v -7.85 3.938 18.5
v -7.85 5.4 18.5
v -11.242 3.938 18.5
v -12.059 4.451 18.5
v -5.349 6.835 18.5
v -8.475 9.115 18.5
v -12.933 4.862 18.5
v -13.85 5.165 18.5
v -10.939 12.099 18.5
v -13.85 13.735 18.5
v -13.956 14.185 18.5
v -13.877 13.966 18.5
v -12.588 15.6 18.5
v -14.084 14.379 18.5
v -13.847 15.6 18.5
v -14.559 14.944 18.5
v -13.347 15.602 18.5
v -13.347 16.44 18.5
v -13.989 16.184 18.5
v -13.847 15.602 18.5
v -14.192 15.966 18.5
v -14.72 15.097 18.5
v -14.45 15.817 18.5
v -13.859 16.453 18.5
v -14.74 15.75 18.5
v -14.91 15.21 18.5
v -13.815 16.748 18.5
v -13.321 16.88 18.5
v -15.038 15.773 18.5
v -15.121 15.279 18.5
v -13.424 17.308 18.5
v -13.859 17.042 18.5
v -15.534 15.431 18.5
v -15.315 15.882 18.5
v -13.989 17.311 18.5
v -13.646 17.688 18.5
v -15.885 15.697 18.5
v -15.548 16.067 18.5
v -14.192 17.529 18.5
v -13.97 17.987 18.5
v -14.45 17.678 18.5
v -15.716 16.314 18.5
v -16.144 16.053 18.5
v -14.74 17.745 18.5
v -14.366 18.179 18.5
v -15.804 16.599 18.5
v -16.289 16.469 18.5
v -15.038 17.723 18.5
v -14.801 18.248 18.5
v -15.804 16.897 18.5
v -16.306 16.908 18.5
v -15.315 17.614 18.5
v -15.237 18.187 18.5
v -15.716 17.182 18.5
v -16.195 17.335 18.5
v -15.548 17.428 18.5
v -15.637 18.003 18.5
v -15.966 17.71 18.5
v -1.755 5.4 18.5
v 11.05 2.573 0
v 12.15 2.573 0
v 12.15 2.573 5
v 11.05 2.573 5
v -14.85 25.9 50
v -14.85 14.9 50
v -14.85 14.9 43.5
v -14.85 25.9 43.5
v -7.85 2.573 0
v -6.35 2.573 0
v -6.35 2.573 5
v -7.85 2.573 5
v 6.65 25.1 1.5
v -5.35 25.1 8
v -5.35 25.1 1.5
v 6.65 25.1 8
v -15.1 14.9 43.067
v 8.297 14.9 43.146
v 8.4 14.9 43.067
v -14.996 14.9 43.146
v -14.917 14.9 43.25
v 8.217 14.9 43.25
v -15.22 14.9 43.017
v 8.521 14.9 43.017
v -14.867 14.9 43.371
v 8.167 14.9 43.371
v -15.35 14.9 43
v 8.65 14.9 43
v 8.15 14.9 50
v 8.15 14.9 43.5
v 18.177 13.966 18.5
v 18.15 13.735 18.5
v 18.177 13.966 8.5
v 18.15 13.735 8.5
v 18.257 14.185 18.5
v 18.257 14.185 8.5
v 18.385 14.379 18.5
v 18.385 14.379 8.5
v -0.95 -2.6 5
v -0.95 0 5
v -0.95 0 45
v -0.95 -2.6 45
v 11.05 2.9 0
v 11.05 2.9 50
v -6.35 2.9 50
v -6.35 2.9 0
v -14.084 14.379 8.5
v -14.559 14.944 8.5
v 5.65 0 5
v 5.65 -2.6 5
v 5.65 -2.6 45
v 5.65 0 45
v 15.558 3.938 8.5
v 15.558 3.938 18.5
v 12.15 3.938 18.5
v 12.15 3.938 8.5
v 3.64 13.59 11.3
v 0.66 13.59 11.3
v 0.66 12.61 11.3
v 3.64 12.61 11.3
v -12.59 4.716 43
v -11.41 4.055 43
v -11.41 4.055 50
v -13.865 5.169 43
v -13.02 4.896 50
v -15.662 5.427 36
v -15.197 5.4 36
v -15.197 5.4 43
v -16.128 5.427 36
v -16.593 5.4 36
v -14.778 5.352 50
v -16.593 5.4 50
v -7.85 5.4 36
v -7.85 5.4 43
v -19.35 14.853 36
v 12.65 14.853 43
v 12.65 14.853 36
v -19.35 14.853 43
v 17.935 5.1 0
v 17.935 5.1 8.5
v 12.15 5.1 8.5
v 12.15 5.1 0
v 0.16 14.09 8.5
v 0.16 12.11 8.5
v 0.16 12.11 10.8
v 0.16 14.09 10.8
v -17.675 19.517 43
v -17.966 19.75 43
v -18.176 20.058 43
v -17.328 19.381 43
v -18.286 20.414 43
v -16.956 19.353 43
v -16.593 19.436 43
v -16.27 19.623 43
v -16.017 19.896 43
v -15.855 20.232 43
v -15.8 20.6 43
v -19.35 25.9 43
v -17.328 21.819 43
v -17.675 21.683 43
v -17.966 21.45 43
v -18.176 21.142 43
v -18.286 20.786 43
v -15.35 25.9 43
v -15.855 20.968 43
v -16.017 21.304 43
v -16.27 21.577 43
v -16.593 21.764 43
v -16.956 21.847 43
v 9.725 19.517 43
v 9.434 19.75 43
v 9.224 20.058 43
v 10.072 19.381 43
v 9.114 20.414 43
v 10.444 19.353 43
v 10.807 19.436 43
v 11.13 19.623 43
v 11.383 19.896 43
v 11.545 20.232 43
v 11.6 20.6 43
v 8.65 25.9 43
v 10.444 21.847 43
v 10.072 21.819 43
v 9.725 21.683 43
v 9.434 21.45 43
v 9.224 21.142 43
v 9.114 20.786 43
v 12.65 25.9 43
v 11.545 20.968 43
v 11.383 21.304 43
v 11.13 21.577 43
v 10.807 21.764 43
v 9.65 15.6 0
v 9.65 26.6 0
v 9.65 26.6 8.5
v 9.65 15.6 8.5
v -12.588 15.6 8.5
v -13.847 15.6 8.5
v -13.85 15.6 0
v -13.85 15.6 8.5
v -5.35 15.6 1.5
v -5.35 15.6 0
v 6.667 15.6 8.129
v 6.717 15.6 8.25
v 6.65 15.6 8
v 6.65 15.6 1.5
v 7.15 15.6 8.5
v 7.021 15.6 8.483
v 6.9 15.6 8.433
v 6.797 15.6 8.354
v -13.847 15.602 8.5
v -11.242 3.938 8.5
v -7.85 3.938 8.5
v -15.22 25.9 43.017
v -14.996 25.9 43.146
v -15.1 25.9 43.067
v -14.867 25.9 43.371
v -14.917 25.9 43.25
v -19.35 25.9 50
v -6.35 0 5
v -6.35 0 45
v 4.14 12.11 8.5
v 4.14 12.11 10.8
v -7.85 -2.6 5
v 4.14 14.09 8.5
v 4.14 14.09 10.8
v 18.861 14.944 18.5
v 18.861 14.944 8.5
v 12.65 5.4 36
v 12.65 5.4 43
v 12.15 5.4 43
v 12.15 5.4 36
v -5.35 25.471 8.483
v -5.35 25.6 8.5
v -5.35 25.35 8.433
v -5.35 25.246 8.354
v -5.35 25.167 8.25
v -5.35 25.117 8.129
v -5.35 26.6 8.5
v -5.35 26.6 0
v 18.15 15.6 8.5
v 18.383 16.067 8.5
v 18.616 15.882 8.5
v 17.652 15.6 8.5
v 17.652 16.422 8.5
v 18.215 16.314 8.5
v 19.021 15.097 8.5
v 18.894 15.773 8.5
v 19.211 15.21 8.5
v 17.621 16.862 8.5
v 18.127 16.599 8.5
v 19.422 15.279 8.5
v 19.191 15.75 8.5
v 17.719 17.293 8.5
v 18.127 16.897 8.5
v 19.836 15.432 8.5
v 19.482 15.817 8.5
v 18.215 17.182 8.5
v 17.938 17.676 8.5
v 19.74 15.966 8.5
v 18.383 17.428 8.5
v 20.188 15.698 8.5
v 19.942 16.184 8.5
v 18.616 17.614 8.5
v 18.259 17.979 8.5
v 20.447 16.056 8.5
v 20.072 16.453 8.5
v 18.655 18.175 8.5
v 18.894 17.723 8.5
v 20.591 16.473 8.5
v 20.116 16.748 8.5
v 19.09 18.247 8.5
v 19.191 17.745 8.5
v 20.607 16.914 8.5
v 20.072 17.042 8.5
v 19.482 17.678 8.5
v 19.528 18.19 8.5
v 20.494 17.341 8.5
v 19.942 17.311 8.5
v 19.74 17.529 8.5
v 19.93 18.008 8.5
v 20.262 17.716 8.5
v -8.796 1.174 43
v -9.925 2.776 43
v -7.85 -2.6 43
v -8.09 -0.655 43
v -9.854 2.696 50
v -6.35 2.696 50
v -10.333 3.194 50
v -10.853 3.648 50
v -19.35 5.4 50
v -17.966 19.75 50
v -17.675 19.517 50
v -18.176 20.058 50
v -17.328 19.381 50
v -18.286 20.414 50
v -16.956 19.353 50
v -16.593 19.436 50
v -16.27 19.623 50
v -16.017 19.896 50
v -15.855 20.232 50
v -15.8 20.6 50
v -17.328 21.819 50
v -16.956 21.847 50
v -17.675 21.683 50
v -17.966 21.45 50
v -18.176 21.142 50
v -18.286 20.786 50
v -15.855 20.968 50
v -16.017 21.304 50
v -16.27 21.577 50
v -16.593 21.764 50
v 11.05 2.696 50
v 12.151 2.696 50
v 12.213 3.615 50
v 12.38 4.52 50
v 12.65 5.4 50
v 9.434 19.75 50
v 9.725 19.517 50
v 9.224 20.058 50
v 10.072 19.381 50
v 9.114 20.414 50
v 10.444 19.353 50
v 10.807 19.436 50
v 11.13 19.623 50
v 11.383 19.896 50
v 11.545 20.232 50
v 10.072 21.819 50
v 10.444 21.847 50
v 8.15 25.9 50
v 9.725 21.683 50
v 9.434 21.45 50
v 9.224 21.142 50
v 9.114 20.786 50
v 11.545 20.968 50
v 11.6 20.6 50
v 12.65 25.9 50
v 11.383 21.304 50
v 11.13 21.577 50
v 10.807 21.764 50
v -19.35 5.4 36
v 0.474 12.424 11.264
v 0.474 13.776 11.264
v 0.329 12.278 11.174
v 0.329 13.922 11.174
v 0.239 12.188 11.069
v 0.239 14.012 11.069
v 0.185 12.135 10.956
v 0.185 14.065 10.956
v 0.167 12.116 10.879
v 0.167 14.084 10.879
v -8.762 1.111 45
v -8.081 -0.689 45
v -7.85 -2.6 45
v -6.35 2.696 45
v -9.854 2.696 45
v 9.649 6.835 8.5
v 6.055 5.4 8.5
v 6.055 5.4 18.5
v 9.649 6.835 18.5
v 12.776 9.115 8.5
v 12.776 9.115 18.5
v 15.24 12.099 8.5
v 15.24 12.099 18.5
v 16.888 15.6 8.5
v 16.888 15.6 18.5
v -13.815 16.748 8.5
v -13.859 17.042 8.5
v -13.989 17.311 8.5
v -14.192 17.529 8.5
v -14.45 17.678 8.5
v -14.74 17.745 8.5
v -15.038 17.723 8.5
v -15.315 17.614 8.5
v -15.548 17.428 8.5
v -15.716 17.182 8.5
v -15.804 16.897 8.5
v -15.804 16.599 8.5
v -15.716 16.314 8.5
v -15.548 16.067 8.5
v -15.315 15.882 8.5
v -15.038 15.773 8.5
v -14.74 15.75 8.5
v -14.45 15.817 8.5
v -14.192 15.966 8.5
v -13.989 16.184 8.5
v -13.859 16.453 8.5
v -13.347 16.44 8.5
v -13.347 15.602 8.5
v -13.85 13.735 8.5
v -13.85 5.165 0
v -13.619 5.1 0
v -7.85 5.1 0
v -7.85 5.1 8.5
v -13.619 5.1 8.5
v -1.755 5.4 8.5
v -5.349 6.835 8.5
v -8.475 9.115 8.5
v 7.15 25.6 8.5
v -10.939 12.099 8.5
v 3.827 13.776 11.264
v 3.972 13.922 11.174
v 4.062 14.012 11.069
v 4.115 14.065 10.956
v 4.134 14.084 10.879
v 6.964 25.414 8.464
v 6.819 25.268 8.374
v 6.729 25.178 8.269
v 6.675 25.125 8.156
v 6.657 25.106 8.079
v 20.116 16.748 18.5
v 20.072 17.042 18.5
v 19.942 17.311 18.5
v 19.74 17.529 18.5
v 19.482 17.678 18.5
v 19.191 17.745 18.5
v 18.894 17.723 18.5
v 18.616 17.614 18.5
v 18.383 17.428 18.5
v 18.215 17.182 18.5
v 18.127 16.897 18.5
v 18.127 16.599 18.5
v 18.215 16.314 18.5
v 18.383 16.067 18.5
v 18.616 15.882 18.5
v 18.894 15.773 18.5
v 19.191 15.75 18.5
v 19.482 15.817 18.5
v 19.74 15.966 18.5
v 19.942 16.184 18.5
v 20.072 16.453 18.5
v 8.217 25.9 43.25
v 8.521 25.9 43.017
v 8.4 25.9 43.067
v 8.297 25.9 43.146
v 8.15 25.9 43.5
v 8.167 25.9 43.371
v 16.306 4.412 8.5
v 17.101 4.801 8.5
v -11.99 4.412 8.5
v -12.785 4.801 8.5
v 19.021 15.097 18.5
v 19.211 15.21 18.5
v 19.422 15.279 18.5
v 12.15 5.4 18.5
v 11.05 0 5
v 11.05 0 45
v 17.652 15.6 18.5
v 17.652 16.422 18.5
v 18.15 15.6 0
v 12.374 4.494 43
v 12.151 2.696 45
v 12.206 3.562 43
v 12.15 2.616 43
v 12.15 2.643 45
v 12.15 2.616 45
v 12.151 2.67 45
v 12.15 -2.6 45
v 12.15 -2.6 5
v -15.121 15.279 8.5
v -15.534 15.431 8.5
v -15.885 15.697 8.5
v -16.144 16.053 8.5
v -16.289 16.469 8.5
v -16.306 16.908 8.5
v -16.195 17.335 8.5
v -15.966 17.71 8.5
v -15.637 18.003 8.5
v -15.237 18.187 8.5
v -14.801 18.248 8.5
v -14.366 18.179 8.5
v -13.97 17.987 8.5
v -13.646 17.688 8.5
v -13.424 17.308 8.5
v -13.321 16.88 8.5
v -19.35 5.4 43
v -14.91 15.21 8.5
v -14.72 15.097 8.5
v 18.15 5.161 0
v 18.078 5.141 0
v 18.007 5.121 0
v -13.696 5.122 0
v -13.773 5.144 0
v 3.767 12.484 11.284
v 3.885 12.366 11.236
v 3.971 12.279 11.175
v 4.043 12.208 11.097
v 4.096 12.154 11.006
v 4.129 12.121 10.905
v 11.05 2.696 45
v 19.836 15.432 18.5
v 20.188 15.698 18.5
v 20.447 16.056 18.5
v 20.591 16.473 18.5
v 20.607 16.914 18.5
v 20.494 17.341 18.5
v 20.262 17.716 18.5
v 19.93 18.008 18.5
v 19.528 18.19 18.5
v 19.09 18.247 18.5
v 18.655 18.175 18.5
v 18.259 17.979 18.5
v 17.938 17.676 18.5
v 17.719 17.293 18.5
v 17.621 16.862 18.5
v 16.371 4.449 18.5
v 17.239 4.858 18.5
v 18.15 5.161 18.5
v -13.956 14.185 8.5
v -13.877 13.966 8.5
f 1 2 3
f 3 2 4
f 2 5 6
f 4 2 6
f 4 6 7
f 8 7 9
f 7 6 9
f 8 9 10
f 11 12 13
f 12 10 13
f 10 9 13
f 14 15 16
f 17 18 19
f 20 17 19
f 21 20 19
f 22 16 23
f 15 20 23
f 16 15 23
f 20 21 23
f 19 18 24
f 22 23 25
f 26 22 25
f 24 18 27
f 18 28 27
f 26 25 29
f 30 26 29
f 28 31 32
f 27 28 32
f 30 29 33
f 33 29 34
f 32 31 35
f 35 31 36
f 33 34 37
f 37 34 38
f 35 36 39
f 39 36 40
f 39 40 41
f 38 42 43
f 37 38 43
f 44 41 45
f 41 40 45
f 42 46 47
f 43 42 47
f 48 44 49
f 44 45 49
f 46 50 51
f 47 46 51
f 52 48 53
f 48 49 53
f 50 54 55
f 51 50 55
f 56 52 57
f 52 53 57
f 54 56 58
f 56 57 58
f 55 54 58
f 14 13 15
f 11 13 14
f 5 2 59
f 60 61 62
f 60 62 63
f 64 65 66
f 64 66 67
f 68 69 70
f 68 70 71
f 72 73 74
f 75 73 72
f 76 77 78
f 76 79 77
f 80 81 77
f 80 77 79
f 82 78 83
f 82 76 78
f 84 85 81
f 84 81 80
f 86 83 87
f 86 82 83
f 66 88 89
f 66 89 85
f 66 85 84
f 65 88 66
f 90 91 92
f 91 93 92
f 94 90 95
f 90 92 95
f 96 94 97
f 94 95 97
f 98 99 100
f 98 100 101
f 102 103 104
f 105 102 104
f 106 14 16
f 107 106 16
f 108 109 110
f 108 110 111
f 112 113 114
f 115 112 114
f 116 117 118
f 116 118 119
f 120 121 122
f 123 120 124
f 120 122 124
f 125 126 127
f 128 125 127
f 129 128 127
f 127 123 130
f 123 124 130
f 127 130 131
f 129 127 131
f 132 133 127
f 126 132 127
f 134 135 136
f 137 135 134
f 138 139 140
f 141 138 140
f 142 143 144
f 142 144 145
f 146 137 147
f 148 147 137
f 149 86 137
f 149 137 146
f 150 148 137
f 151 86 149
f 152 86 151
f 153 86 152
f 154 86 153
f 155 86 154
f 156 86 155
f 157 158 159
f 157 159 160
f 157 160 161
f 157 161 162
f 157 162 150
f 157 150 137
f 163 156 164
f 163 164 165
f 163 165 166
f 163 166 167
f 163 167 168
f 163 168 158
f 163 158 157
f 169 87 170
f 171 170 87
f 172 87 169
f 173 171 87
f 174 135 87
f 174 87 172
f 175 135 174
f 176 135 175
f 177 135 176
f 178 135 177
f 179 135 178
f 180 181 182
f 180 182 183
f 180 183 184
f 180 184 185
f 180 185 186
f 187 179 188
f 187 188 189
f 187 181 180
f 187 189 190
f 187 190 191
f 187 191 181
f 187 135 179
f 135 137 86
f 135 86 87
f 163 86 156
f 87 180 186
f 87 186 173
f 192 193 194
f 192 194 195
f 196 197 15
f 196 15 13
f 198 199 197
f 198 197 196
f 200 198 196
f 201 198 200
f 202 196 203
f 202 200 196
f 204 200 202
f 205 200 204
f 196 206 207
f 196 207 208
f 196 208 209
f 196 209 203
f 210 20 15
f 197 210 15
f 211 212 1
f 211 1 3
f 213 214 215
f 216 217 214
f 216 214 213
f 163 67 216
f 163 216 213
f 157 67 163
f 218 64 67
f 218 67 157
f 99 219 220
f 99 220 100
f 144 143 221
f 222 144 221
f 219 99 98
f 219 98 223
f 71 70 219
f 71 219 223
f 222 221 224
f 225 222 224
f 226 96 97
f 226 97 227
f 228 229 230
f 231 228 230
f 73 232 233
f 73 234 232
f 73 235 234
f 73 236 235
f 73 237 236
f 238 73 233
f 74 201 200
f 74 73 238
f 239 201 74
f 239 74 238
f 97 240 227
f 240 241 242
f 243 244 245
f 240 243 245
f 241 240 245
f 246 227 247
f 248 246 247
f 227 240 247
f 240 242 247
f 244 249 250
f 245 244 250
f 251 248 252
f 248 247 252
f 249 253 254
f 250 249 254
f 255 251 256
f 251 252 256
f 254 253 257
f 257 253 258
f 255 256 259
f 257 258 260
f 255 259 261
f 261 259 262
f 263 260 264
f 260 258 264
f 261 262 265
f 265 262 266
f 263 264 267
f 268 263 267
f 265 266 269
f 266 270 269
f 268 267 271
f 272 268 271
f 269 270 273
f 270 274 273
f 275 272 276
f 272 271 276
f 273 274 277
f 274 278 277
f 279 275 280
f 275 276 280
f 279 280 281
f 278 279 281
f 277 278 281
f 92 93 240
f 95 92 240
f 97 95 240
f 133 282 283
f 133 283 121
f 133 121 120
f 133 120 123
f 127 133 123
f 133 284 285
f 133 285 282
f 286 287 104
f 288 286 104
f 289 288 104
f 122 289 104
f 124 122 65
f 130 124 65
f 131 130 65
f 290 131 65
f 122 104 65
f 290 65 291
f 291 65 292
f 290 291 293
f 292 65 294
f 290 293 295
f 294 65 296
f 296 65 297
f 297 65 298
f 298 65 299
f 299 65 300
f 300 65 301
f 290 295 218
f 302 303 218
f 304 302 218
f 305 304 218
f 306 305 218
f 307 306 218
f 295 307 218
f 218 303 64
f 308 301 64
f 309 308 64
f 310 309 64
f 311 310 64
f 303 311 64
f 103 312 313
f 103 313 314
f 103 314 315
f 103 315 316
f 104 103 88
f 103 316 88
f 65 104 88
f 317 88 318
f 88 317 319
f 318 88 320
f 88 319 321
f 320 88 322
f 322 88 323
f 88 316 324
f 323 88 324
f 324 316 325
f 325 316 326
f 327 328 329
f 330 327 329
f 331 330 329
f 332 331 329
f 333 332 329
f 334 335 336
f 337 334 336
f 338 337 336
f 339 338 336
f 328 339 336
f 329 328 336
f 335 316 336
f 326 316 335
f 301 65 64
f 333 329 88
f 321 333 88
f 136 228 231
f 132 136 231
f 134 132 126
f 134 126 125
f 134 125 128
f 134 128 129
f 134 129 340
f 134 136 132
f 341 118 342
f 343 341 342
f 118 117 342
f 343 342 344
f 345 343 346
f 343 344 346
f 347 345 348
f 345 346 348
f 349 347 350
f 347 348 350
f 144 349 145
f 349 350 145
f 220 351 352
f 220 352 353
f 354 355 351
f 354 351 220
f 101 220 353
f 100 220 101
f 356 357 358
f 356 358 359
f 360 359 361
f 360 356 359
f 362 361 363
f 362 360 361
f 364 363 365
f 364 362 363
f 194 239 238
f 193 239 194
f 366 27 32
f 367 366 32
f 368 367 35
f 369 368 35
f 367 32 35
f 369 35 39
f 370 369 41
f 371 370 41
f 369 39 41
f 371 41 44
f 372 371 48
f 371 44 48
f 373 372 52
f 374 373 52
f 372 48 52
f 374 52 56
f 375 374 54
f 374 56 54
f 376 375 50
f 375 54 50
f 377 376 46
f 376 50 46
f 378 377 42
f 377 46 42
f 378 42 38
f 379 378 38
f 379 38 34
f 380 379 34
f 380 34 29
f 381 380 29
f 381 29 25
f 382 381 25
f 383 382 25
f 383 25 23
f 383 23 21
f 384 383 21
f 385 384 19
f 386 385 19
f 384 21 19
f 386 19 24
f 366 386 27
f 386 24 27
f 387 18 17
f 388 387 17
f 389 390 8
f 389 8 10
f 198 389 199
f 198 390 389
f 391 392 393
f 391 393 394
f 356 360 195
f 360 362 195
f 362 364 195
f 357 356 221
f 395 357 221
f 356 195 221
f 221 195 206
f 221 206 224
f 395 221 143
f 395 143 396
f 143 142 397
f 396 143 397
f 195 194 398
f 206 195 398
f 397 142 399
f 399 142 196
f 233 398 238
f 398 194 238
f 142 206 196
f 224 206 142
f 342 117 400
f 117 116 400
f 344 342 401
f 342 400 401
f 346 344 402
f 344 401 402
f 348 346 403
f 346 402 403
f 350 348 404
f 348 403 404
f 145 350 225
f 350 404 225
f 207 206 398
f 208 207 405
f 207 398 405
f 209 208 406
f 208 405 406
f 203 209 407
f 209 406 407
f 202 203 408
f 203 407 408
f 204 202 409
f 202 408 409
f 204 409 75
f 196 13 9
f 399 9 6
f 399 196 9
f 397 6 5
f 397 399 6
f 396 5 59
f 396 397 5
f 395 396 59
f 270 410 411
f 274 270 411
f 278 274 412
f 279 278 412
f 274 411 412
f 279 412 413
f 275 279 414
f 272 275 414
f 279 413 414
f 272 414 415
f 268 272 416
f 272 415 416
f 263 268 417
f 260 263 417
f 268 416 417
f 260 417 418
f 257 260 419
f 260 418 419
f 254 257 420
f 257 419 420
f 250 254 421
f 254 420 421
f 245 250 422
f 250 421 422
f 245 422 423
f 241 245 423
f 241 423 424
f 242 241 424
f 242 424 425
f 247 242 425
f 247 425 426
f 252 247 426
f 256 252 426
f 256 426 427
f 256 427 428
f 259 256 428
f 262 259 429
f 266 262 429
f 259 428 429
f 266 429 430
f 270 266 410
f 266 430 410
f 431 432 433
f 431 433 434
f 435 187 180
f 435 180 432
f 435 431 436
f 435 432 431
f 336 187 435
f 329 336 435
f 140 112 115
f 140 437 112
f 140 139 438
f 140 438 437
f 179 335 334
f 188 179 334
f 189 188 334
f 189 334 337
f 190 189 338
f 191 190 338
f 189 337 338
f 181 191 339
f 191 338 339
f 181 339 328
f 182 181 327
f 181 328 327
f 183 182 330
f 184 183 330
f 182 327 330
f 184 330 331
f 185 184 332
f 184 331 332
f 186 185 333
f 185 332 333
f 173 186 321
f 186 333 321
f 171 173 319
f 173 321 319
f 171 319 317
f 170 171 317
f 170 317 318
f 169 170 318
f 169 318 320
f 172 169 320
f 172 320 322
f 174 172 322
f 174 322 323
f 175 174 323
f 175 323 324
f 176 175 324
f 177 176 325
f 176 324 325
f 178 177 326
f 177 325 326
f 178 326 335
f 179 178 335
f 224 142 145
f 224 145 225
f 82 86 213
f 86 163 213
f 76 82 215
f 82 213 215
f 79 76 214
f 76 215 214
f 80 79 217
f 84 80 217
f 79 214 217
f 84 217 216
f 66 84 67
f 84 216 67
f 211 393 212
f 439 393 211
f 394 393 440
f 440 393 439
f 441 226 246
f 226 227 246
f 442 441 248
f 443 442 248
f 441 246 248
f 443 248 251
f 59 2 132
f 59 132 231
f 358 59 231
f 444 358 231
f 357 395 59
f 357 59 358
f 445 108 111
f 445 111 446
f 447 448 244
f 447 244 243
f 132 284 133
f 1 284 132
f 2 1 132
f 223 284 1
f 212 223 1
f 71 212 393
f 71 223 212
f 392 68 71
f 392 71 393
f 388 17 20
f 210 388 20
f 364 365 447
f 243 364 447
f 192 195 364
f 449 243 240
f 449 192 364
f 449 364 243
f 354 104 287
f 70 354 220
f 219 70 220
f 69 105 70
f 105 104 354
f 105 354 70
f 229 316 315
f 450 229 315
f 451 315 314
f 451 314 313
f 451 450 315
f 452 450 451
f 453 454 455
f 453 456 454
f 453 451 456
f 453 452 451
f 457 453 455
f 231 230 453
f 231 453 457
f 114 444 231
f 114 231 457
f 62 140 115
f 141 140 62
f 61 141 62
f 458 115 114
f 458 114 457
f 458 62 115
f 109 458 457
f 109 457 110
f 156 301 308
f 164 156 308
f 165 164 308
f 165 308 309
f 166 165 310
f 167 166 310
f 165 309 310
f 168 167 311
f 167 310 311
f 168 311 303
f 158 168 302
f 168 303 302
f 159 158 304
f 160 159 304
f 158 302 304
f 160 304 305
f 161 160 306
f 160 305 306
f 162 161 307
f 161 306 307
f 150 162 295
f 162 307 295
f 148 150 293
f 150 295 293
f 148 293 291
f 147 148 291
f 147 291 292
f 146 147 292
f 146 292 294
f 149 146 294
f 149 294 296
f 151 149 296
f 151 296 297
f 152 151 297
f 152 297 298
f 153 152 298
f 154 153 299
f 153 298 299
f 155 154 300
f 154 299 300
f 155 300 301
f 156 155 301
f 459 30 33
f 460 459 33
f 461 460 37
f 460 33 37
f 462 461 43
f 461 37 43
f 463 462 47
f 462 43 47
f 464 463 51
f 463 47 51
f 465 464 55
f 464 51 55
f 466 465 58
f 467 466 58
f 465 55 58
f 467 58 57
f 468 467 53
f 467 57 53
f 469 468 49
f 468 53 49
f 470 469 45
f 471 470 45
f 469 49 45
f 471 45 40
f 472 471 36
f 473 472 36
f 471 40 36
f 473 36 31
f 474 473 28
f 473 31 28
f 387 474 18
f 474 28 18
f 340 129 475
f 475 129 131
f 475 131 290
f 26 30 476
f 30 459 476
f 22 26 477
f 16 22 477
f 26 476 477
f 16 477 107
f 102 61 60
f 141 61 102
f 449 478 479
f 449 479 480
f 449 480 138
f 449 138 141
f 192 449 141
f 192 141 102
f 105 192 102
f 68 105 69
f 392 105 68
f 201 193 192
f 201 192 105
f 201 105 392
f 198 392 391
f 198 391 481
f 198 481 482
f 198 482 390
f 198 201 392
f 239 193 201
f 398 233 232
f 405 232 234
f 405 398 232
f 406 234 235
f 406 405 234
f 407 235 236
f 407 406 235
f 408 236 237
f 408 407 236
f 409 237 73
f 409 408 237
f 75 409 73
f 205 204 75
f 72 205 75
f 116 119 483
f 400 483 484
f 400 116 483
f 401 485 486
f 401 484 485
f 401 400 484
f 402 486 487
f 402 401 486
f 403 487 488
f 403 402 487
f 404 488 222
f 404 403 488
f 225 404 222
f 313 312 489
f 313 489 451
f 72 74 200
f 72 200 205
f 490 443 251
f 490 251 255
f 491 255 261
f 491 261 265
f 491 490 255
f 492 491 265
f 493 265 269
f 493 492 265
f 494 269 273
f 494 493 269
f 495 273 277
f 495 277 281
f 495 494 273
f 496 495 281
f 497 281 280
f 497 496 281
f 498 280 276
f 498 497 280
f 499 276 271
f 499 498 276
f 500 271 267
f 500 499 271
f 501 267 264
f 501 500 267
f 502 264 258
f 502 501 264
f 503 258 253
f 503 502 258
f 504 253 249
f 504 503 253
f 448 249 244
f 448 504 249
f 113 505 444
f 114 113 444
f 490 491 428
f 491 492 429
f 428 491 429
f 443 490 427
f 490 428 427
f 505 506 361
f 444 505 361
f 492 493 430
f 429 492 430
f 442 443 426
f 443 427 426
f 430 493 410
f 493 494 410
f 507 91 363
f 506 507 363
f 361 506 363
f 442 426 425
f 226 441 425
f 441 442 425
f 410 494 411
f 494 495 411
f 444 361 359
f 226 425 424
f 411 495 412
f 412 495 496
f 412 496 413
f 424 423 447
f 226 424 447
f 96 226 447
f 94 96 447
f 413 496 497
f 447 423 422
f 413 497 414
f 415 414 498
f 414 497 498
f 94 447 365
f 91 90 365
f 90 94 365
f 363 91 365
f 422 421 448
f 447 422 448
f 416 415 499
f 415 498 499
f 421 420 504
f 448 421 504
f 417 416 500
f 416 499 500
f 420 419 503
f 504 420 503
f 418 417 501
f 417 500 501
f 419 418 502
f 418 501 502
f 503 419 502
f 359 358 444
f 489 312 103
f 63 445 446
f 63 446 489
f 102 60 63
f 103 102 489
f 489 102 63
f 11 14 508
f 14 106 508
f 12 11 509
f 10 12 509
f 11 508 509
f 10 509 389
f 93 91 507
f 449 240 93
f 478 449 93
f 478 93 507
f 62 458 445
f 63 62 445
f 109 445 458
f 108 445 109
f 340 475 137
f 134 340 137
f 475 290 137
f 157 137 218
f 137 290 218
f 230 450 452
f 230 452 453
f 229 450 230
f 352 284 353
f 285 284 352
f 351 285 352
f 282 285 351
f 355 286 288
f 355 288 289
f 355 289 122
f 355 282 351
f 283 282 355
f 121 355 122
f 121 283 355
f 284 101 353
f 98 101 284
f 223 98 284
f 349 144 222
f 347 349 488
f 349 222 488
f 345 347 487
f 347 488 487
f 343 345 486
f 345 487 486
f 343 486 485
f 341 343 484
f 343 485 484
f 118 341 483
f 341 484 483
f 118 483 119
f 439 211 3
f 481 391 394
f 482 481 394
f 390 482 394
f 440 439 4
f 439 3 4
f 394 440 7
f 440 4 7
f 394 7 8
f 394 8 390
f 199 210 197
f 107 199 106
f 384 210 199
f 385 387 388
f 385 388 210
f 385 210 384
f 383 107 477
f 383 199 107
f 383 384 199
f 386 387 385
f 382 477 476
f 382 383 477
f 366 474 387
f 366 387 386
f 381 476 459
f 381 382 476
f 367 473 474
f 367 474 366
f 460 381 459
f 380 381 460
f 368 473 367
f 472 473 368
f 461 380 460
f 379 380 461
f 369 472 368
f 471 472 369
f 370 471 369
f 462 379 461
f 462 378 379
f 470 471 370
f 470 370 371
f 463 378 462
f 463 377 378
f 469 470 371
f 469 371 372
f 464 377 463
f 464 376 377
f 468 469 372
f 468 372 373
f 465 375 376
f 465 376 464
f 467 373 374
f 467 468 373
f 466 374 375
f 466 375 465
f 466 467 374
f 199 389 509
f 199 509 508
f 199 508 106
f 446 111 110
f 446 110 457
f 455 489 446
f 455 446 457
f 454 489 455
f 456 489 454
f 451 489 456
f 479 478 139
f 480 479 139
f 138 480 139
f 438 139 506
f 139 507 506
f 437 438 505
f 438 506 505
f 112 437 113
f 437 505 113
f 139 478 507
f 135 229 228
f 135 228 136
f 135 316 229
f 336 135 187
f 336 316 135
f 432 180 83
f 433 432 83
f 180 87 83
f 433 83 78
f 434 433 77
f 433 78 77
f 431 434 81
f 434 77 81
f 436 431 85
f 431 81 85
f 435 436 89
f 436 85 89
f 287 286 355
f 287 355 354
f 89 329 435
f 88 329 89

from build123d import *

# Parameters (mm, degrees)
BOSS_EXTRUDE1_DEPTH = 50
SKETCH2_R           = 1.25
BOSS_EXTRUDE2_DEPTH = 7
FILLET1_R           = 8
BOSS_EXTRUDE3_DEPTH = 8.5
SKETCH7_W           = 12
SKETCH7_H           = 9.5
CUT_EXTRUDE1_DEPTH  = 7
BOSS_EXTRUDE4_DEPTH = 10
SKETCH9_W           = 3.98
SKETCH9_H           = 1.98
BOSS_EXTRUDE5_DEPTH = 2.8
SKETCH11_W          = 32
SKETCH11_H          = 9.453112349
BOSS_EXTRUDE6_DEPTH = 7
SKETCH16_R          = 1
BOSS_EXTRUDE7_DEPTH = 10
FILLET2_R           = 1
FILLET4_R           = 0.5
FILLET5_R           = 0.5
FILLET6_R           = 0.5
SKETCH17_R          = 8
CUT_EXTRUDE2_DEPTH  = 61.270972563
SKETCH18_W          = 26.905399266
SKETCH18_H          = 5.924124609
CUT_EXTRUDE3_DEPTH  = 5
SKETCH19_W          = 27.645914842
SKETCH19_H          = 7.775413549
CUT_EXTRUDE4_DEPTH  = 5


with BuildPart() as part:
    # Sketch1 → Boss-Extrude1 (new body)
    with BuildSketch(Plane.XY):
        Polygon((-6.349640288, 0), (-0.949640288, 0), (-0.949640288, -2.6), (-7.849640288, -2.6), (-7.849640288, 5.4), (12.150359712, 5.4), (12.150359712, -2.6), (5.650359712, -2.6), (5.650359712, 0), (11.050359712, 0), (11.050359712, 2.9), (-6.349640288, 2.9), align=None)
    extrude(amount=BOSS_EXTRUDE1_DEPTH)

    # Sketch2 → Boss-Extrude2 (add)
    with BuildSketch(Plane.XY.offset(50)):
        Polygon((-19.349640288, 25.9), (-19.349640288, 5.4), (12.650359712, 5.4), (12.650359712, 25.9), (8.150359712, 25.9), (8.150359712, 14.9), (-14.849640288, 14.9), (-14.849640288, 25.9), align=None)
        with Locations((10.350359712, 20.6)):
            Circle(SKETCH2_R, mode=Mode.SUBTRACT)
        with Locations((-17.049640288, 20.6)):
            Circle(SKETCH2_R, mode=Mode.SUBTRACT)
    extrude(amount=-BOSS_EXTRUDE2_DEPTH)

    # Fillet1
    # the kernel refuses this fillet: 8 mm, written as the material it adds along each edge
    with BuildSketch(Plane(origin=(-7.849640288, 5.4, 43), x_dir=(0, -1, 0), z_dir=(0, 0, 1))) as fillet1_piece_1:
        with BuildLine():
            CenterArc((FILLET1_R, -FILLET1_R), FILLET1_R, 90, 90)
            Line((0, -FILLET1_R), (0, 0))
            Line((0, 0), (FILLET1_R, 0))
        make_face()
    extrude(amount=7)
    with BuildSketch(Plane(origin=(12.150359712, 5.4, 43), x_dir=(0, -1, 0), z_dir=(0, 0, 1))) as fillet1_piece_2:
        with BuildLine():
            CenterArc((2.783882181, 8), FILLET1_R, 249.635865194, 20.364134806)
            Line((0, 0.5), (0, 0))
            Line((0, 0), (2.783882181, 0))
        make_face()
    extrude(amount=7)

    # Sketch4 → Boss-Extrude3 (add)
    with BuildSketch(Plane(origin=(0, 0, 0), x_dir=(-1, 0, 0), z_dir=(0, 0, -1))):
        Polygon((-18.150359712, 15.6), (-18.150359712, 5.1), (13.849640288, 5.1), (13.849640288, 15.6), (5.349640288, 15.6), (5.349640288, 26.6), (-9.650359712, 26.6), (-9.650359712, 15.6), align=None)
    extrude(amount=-BOSS_EXTRUDE3_DEPTH)

    # Sketch7 → Cut-Extrude1 (cut)
    with BuildSketch(Plane.XY.offset(8.5)):
        with Locations((0.650359712, 20.35)):
            Rectangle(SKETCH7_W, SKETCH7_H)
    extrude(amount=-CUT_EXTRUDE1_DEPTH, mode=Mode.SUBTRACT)

    # Sketch8 → Boss-Extrude4 (add)
    with BuildSketch(Plane.XY.offset(8.5)):
        with BuildLine():
            Line((-13.849640288, 15.6), (-12.587686291, 15.6))
            ThreePointArc((-12.587686291, 15.6), (2.150359712, 4.9), (16.888405716, 15.6))
            Line((16.888405716, 15.6), (18.150359712, 15.6))
            Line((18.150359712, 15.6), (18.150359712, 3.937972429))
            Line((18.150359712, 3.937972429), (-13.849640288, 3.937972429))
            Line((-13.849640288, 3.937972429), (-13.849640288, 15.6))
        make_face()
    extrude(amount=BOSS_EXTRUDE4_DEPTH)

    # Sketch9 → Boss-Extrude5 (add)
    with BuildSketch(Plane.XY.offset(8.5)):
        with Locations((2.150359712, 13.1)):
            Rectangle(SKETCH9_W, SKETCH9_H)
    extrude(amount=BOSS_EXTRUDE5_DEPTH)

    # Sketch11 → Boss-Extrude6 (add)
    with BuildSketch(Plane(origin=(0, 0, 43), x_dir=(-1, 0, 0), z_dir=(0, 0, -1))):
        with Locations((3.349640288, 10.126556175)):
            Rectangle(SKETCH11_W, SKETCH11_H)
    extrude(amount=BOSS_EXTRUDE6_DEPTH)

    # Sketch16 → Boss-Extrude7 (add)
    # profile 1 of 2: a face of its own
    with BuildSketch(Plane.XY.offset(18.5)):
        with BuildLine():
            Line((-13.346805139, 15.601949196), (-13.846805139, 15.601949196))
            Line((-13.846805139, 15.601949196), (-13.849640288, 14.1))
            Line((-13.849640288, 14.1), (-14.815015575, 15.247623037))
            ThreePointArc((-14.815015575, 15.247623037), (-15.7608574, 17.911832315), (-13.346805139, 16.44044538))
            Line((-13.346805139, 16.44044538), (-13.346805139, 15.601949196))
        make_face()
        with Locations((-14.815015575, 16.747623037)):
            Circle(SKETCH16_R, mode=Mode.SUBTRACT)
    # profile 2 of 2: a face of its own
    with BuildSketch(Plane.XY.offset(18.5)):
        with BuildLine():
            Line((17.652000257, 15.6), (18.150359712, 15.6))
            Line((18.150359712, 15.6), (18.150359712, 14.1))
            Line((18.150359712, 14.1), (19.116258964, 15.247623037))
            ThreePointArc((19.116258964, 15.247623037), (20.054810716, 17.91771731), (17.652000257, 16.422128892))
            Line((17.652000257, 16.422128892), (17.652000257, 15.6))
        make_face()
        with Locations((19.116258964, 16.747623037)):
            Circle(SKETCH16_R, mode=Mode.SUBTRACT)
    extrude(amount=-BOSS_EXTRUDE7_DEPTH)

    # Fillet2
    fillet2_edges = [part.edges().sort_by_distance(p)[0] for p in [
        (-13.849640288, 14.1, 13.5),
        (-14.815015575, 15.247623037, 13.5),
        (19.116258964, 15.247623037, 13.5),
        (18.150359712, 14.1, 13.5),
    ]]
    fillet(fillet2_edges, radius=FILLET2_R)

    # Fillet4
    fillet4_edges = [part.edges().sort_by_distance(p)[0] for p in [
        (0.160359712, 13.1, 11.3),
        (2.150359712, 12.11, 11.3),
        (4.140359712, 13.1, 11.3),
        (2.150359712, 14.09, 11.3),
    ]]
    fillet(fillet4_edges, radius=FILLET4_R)

    # Fillet5
    fillet5_edges = [part.edges().sort_by_distance(p)[0] for p in [
        (6.650359712, 20.35, 8.5),
        (0.650359712, 25.1, 8.5),
    ]]
    fillet(fillet5_edges, radius=FILLET5_R)

    # Fillet6
    fillet6_edges = [part.edges().sort_by_distance(p)[0] for p in [
        (-14.849640288, 20.4, 43),
        (8.150359712, 20.4, 43),
    ]]
    fillet(fillet6_edges, radius=FILLET6_R)

    # Sketch17 → Cut-Extrude2 (cut, through all)
    with BuildSketch(Plane.XY.offset(50)):
        with Locations((-15.895053234, -2.569483857)):
            Circle(SKETCH17_R)
        with Locations((20.210973801, -2.569483857)):
            Circle(SKETCH17_R)
    extrude(amount=-CUT_EXTRUDE2_DEPTH, mode=Mode.SUBTRACT)

    # Sketch18 → Cut-Extrude3 (cut)
    with BuildSketch(Plane.XY.offset(50)):
        with Locations((1.903783169, -0.265657621)):
            Rectangle(SKETCH18_W, SKETCH18_H)
    extrude(amount=-CUT_EXTRUDE3_DEPTH, mode=Mode.SUBTRACT)

    # Sketch19 → Cut-Extrude4 (cut)
    with BuildSketch(Plane(origin=(0, 0, 0), x_dir=(-1, 0, 0), z_dir=(0, 0, -1))):
        with Locations((-1.944922923, -1.314721353)):
            Rectangle(SKETCH19_W, SKETCH19_H)
    extrude(amount=-CUT_EXTRUDE4_DEPTH, mode=Mode.SUBTRACT)


solid = part.part
